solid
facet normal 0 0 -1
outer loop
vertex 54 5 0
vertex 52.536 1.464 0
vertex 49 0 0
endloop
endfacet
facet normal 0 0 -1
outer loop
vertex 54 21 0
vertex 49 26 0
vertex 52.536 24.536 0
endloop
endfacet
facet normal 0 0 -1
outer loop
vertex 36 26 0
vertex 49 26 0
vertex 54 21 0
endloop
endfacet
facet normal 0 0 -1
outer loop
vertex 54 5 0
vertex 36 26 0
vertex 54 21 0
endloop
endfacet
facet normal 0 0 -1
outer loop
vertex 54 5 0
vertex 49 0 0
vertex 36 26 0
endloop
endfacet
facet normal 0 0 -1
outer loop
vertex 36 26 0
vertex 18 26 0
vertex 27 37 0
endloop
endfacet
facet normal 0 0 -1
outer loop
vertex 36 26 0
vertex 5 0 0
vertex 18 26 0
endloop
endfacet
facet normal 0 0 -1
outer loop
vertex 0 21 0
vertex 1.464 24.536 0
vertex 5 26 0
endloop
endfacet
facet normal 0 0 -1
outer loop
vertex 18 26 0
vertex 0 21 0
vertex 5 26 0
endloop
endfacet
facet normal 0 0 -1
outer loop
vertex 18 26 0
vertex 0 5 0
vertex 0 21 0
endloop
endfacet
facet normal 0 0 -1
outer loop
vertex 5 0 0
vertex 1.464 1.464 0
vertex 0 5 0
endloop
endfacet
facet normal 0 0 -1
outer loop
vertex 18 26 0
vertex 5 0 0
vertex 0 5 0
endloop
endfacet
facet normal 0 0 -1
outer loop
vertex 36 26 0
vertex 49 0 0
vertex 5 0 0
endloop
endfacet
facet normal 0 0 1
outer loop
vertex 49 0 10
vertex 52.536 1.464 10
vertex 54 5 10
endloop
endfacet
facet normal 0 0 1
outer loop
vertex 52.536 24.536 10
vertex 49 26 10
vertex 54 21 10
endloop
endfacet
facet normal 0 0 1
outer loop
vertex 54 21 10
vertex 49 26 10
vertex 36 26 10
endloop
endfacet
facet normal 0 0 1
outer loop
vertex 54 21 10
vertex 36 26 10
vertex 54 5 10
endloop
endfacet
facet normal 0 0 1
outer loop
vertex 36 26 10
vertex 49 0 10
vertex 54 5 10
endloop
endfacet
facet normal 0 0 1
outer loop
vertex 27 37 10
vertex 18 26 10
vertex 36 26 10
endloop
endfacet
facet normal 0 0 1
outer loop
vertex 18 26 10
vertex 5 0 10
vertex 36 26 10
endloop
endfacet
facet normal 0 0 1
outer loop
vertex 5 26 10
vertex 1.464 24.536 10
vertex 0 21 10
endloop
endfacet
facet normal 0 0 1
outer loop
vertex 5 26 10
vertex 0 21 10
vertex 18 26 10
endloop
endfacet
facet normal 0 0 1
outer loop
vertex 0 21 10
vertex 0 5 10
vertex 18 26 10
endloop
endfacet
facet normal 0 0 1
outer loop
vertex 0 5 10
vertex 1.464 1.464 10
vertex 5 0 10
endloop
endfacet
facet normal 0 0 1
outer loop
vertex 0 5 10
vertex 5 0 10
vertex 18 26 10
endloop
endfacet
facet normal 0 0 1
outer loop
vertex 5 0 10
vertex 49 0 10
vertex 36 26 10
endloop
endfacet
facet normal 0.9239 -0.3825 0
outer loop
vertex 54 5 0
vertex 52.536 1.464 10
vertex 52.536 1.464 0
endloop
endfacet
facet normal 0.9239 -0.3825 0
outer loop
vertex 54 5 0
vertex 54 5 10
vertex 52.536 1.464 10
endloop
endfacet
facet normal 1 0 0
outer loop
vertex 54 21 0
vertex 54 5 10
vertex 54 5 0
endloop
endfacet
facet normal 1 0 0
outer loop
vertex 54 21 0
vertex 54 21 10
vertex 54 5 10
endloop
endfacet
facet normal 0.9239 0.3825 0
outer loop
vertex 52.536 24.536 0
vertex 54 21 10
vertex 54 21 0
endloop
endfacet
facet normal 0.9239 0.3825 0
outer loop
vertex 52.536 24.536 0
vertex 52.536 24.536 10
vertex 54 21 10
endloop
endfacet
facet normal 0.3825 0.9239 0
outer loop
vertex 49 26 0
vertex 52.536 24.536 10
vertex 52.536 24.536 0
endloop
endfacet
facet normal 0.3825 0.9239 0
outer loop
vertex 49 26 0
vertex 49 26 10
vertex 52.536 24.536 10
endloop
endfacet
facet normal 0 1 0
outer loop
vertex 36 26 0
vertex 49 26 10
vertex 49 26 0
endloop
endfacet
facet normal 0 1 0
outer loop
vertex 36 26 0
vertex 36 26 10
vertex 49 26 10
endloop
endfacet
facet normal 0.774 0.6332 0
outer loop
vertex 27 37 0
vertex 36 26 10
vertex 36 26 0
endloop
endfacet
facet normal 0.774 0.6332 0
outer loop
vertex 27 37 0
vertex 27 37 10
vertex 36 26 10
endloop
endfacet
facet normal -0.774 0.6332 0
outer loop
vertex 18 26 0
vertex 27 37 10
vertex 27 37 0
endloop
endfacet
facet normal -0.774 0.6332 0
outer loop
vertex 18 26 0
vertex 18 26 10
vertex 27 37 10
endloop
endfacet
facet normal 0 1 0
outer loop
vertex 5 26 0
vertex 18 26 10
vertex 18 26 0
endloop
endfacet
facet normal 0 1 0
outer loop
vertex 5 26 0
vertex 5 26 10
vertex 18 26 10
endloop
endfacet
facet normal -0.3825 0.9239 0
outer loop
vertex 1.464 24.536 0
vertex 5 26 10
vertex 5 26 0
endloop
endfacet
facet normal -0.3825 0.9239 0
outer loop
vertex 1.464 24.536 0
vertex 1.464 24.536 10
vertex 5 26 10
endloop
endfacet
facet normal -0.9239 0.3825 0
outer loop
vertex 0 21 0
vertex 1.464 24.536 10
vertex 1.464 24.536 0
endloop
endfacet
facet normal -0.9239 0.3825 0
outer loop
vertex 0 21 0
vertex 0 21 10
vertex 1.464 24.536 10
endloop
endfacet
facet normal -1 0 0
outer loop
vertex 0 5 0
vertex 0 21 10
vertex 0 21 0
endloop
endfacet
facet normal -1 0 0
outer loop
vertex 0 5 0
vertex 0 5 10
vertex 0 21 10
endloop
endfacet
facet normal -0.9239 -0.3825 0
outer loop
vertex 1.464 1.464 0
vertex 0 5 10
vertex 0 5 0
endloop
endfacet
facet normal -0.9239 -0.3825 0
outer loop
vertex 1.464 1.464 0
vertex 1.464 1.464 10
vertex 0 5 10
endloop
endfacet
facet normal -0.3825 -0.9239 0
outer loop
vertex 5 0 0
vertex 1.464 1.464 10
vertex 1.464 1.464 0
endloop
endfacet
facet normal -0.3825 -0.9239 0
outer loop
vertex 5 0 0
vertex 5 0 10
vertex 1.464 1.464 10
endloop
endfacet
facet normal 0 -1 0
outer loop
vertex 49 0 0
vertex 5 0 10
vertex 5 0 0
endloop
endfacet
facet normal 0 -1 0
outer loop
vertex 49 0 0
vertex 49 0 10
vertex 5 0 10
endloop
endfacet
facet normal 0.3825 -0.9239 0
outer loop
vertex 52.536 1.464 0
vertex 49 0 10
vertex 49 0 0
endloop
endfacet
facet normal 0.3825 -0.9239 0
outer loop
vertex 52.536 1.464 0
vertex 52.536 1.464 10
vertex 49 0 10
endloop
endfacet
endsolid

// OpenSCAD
$fn = 32;

// ----------------------------------------------------------------------
// Ratchet pawl: 54 x 26 mm body, beak 11 mm сверху
// ----------------------------------------------------------------------

// --- parameters (mm) ---
profile_height = 10;      // extrusion height
profile_points = 15;      // points of the closed outline

profile = [[0, 5], [1.464, 1.464], [5, 0], [49, 0], [52.536, 1.464], [54, 5], [54, 21], [52.536, 24.536], [49, 26], [36, 26], [27, 37], [18, 26], [5, 26], [1.464, 24.536], [0, 21]];  // single closed polygon, 15 points, counter clockwise

// --- the one profile operation ---
linear_extrude(height = profile_height) polygon(points = profile);
